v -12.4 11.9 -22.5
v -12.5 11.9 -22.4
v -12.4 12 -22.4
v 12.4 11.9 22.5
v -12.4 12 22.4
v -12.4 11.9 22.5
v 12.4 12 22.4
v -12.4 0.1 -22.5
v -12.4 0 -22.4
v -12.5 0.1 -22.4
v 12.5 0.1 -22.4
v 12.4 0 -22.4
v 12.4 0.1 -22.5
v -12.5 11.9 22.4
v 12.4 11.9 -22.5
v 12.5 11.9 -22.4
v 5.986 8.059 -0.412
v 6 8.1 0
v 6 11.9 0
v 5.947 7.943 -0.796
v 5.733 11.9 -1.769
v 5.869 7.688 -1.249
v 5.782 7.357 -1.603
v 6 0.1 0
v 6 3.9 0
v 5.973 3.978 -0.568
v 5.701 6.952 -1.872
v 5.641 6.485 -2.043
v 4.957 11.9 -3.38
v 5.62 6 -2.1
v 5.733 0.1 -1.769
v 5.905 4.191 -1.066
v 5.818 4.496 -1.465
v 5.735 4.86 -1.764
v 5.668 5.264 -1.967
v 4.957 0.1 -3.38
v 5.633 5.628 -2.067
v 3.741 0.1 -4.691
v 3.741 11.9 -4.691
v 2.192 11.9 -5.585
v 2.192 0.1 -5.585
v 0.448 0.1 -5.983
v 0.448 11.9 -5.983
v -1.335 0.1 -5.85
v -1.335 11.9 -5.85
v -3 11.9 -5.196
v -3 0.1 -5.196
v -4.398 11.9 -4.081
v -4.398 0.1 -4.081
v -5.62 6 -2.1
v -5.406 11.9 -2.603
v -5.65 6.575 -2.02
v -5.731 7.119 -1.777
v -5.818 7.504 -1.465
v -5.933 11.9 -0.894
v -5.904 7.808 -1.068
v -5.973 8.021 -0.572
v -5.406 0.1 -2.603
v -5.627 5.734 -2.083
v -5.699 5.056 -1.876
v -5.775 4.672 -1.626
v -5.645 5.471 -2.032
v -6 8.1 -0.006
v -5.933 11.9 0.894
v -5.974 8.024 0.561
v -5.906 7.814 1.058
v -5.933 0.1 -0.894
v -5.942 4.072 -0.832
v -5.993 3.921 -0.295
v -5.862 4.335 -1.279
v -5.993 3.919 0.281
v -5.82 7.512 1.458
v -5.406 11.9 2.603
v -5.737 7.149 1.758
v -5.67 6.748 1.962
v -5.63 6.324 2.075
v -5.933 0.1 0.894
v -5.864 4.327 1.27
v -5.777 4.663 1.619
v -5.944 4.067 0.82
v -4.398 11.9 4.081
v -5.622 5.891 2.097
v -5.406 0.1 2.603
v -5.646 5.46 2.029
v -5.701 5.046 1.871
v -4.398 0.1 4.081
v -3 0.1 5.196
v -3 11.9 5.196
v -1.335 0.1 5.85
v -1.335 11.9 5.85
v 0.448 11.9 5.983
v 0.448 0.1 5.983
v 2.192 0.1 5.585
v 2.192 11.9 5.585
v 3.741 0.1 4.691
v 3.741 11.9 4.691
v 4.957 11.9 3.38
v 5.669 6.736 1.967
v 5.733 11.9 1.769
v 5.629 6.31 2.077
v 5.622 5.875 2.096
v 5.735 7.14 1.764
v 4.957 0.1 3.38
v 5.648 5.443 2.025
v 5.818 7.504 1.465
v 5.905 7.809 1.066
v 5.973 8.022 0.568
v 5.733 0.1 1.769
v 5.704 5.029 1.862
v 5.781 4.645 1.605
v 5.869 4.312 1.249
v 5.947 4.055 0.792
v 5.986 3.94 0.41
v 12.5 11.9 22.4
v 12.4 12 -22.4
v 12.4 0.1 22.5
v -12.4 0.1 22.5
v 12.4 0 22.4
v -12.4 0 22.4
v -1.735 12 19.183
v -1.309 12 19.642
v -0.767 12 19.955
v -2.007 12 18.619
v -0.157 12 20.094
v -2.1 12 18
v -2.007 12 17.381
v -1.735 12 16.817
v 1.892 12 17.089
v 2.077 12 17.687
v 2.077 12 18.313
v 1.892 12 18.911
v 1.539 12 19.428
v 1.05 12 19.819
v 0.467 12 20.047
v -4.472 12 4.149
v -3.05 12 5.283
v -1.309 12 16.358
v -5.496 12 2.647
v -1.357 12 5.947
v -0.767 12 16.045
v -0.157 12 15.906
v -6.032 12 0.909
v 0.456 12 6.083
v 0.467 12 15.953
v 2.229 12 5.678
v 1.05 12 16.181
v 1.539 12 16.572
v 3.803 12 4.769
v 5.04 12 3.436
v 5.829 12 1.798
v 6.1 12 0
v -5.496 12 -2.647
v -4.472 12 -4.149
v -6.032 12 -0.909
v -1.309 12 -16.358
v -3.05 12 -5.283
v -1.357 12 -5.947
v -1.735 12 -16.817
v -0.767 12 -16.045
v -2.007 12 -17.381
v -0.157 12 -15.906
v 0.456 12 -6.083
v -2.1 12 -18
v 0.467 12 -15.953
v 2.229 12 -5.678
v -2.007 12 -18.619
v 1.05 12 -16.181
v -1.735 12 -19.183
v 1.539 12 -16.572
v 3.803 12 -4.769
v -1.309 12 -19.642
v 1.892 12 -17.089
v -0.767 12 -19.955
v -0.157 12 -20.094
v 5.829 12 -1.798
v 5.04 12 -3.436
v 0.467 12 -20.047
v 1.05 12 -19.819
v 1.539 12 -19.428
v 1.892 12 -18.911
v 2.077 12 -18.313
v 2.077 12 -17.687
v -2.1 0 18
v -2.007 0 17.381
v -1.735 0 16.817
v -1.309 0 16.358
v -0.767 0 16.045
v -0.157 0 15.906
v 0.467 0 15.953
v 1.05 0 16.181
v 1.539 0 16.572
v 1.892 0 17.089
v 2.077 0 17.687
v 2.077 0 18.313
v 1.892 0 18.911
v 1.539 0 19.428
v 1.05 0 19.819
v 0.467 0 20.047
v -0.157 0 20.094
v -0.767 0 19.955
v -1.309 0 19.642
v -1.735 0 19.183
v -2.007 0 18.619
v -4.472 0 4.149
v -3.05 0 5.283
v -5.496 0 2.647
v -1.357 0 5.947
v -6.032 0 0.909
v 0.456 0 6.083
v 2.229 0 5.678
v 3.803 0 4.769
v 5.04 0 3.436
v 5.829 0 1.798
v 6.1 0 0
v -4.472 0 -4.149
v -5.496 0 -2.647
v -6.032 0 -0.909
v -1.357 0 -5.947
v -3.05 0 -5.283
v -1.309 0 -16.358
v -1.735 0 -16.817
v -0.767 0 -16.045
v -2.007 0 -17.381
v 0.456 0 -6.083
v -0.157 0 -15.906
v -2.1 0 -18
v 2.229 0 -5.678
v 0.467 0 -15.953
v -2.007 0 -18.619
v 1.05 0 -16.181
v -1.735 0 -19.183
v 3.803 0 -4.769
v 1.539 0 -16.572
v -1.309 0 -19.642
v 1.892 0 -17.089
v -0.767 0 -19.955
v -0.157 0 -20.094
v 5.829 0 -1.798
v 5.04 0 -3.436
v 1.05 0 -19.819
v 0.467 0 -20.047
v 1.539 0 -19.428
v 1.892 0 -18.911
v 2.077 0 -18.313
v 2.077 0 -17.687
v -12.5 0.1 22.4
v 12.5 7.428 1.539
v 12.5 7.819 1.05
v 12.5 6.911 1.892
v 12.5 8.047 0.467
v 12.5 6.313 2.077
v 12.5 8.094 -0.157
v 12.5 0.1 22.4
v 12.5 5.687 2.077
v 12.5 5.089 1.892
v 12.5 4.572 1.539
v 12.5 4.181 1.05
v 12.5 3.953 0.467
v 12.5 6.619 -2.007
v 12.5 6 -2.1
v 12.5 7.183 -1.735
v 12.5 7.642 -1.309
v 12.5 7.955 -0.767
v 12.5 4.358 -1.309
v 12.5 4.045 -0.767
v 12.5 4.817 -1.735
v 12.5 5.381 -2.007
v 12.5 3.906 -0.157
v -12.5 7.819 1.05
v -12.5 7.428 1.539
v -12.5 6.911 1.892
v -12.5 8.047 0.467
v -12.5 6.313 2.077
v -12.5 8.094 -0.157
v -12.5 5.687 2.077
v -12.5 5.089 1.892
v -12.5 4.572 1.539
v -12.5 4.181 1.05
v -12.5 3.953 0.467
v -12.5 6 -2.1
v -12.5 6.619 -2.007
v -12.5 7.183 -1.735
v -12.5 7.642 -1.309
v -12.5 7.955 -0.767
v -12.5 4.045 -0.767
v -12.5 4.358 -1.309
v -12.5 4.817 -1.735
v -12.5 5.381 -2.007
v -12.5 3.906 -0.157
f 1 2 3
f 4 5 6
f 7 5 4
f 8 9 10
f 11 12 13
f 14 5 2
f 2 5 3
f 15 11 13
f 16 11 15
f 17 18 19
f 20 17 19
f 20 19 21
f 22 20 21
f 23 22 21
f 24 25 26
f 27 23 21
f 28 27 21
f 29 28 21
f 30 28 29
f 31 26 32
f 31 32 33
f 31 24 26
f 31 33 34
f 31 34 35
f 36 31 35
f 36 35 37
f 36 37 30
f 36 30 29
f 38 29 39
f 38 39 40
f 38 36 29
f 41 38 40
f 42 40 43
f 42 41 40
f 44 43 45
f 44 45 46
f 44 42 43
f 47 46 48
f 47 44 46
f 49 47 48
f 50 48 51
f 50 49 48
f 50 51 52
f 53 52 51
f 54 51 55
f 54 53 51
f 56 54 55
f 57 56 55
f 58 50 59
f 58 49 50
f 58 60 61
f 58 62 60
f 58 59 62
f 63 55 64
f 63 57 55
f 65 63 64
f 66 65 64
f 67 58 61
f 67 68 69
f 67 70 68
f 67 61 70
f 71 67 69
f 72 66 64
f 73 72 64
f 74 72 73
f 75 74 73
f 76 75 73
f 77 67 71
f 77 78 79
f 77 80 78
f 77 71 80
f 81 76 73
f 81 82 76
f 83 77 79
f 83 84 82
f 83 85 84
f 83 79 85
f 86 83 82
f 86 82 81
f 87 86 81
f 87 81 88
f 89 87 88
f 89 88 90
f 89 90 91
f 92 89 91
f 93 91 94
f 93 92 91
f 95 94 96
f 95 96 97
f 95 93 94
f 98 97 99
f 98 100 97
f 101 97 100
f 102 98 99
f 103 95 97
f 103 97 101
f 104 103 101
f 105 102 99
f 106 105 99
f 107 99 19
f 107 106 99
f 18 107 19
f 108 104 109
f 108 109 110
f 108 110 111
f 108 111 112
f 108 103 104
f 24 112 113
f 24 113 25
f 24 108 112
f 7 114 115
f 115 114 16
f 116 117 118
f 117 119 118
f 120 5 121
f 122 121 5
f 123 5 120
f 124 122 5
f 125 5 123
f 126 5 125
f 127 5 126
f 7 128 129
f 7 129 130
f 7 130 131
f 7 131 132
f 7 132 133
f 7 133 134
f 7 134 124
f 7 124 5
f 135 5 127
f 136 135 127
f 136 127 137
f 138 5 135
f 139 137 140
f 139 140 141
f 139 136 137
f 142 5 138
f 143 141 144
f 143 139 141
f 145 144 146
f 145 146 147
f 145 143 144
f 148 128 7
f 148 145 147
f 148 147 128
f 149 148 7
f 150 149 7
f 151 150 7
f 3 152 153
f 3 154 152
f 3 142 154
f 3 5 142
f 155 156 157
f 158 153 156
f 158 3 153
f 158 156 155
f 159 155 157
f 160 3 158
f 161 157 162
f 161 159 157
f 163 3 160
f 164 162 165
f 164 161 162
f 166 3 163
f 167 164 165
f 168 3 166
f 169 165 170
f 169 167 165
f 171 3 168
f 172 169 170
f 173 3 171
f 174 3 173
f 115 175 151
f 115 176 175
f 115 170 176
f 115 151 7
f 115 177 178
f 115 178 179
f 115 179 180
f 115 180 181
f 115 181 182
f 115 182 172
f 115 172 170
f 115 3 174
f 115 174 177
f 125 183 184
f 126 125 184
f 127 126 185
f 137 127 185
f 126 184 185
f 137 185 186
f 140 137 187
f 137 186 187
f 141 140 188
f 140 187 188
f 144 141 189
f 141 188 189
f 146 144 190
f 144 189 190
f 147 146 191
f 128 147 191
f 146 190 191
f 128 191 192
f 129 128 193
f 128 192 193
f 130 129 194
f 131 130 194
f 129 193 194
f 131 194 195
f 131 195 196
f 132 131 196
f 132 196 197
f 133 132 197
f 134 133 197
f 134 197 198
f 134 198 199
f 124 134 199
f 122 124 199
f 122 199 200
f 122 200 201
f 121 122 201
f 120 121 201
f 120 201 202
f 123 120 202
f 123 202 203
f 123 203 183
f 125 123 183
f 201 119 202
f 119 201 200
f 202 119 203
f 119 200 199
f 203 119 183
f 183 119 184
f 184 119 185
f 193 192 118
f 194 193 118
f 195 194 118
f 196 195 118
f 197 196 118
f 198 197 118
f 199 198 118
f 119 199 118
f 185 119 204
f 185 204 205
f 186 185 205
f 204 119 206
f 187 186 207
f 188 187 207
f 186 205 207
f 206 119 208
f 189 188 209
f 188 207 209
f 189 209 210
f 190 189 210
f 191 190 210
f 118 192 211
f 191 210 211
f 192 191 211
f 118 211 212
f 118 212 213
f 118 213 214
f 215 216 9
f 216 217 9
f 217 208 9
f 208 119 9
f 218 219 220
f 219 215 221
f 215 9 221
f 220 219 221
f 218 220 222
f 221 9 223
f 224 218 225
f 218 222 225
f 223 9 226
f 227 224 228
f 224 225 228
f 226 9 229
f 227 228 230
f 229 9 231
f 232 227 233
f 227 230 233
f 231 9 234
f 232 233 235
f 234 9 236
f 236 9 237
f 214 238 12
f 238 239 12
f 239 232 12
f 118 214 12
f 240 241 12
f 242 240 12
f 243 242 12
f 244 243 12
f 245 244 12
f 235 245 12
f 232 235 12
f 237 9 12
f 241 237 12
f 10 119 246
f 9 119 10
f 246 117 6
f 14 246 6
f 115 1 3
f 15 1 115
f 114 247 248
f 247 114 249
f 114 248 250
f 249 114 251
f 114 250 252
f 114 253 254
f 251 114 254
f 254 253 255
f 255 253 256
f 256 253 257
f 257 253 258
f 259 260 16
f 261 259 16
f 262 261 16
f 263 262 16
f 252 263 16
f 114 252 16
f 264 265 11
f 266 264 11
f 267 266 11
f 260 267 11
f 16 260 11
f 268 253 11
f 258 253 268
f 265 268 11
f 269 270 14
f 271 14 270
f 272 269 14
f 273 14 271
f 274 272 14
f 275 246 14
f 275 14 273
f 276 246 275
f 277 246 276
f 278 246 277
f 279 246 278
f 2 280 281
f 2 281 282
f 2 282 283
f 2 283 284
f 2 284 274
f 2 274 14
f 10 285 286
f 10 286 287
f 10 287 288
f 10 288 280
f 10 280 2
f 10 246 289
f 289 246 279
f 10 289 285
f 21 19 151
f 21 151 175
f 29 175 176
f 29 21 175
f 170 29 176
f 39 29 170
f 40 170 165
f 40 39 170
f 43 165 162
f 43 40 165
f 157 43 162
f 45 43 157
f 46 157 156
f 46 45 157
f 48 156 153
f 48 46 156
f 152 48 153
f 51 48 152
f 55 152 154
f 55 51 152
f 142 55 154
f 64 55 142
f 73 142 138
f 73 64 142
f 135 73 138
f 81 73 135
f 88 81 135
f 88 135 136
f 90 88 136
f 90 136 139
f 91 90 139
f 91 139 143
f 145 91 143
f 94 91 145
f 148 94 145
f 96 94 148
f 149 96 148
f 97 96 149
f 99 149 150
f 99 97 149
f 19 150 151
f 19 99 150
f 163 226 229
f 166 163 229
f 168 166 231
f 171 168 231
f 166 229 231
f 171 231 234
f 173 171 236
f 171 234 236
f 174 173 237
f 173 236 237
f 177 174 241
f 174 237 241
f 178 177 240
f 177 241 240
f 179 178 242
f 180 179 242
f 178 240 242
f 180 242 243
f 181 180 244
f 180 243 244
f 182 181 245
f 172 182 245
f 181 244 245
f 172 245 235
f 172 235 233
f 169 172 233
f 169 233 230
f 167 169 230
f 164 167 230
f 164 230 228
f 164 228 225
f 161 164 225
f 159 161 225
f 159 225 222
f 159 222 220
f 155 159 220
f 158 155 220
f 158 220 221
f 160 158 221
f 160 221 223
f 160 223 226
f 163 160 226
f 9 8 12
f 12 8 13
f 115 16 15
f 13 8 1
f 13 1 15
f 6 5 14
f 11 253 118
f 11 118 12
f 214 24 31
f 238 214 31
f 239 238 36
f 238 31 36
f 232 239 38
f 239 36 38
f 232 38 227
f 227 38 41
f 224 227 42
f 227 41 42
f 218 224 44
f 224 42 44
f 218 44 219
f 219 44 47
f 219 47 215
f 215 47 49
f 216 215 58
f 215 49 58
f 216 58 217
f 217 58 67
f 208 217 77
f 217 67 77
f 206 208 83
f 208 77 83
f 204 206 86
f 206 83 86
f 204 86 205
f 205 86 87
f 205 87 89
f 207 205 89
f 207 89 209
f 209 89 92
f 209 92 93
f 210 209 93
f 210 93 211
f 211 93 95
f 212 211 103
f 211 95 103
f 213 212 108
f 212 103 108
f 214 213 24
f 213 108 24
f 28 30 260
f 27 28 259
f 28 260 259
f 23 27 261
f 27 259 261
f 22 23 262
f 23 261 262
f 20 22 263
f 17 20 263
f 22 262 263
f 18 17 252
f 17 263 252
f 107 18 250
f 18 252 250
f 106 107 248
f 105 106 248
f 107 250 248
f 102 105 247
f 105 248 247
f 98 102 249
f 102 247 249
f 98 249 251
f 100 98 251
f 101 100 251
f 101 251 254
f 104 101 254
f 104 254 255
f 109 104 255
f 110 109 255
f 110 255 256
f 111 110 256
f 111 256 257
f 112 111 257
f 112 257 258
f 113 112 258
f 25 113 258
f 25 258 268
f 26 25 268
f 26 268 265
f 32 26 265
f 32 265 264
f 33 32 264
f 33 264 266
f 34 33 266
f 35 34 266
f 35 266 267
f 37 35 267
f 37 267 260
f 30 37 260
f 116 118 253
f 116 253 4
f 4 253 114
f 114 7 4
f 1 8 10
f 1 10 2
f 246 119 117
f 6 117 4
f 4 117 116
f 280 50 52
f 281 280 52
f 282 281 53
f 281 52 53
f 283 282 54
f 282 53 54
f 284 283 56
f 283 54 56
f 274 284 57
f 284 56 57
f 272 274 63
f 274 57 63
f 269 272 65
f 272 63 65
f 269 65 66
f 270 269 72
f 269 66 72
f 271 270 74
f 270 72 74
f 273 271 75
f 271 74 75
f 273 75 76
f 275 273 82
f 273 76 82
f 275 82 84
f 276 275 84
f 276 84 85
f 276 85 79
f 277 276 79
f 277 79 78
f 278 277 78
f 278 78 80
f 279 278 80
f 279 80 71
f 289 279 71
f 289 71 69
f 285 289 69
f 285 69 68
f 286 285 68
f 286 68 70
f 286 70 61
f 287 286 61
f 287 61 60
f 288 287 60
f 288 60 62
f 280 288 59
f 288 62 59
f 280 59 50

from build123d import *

# Parameters (mm, degrees)
SKETCH1_W           = 25
SKETCH1_H           = 45
SKETCH1_R           = 6
BOSS_EXTRUDE1_DEPTH = 12
M5_TAPPED_HOLE2_D   = 4.2
M5_TAPPED_HOLE3_D   = 4.2
CHAMFER1_SIZE       = 0.1


with BuildPart() as part:
    # Sketch1 → Boss-Extrude1 (new body)
    with BuildSketch(Plane(origin=(0, 0, 0), x_dir=(1, 0, 0), z_dir=(0, 1, 0))):
        Rectangle(SKETCH1_W, SKETCH1_H)
        Circle(SKETCH1_R, mode=Mode.SUBTRACT)
    extrude(amount=BOSS_EXTRUDE1_DEPTH)

    # M5 Tapped Hole2 (through all)
    with Locations(Plane(origin=(0, 12, 0), x_dir=(1, 0, 0), z_dir=(0, 1, 0))):
        with Locations((0, 18), (0, -18)):
            Hole(M5_TAPPED_HOLE2_D / 2)

    # M5 Tapped Hole3 (through all)
    with Locations(Plane.ZY.offset(12.5)):
        with Locations((0, 6)):
            Hole(M5_TAPPED_HOLE3_D / 2)

    # Chamfer1
    chamfer1_edges = [part.edges().sort_by_distance(p)[0] for p in [
        (-6, 0, 0),
        (-6, 12, 0),
        (-12.5, 12, 0),
        (0, 12, 22.5),
        (12.5, 12, 0),
        (0, 0, 22.5),
        (-12.5, 0, 0),
        (0, 0, -22.5),
        (12.5, 0, 0),
        (12.5, 6, 22.5),
        (-12.5, 6, 22.5),
        (-12.5, 6, -22.5),
        (12.5, 6, -22.5),
        (0, 12, -22.5),
    ]]
    chamfer(chamfer1_edges, length=CHAMFER1_SIZE)


solid = part.part
